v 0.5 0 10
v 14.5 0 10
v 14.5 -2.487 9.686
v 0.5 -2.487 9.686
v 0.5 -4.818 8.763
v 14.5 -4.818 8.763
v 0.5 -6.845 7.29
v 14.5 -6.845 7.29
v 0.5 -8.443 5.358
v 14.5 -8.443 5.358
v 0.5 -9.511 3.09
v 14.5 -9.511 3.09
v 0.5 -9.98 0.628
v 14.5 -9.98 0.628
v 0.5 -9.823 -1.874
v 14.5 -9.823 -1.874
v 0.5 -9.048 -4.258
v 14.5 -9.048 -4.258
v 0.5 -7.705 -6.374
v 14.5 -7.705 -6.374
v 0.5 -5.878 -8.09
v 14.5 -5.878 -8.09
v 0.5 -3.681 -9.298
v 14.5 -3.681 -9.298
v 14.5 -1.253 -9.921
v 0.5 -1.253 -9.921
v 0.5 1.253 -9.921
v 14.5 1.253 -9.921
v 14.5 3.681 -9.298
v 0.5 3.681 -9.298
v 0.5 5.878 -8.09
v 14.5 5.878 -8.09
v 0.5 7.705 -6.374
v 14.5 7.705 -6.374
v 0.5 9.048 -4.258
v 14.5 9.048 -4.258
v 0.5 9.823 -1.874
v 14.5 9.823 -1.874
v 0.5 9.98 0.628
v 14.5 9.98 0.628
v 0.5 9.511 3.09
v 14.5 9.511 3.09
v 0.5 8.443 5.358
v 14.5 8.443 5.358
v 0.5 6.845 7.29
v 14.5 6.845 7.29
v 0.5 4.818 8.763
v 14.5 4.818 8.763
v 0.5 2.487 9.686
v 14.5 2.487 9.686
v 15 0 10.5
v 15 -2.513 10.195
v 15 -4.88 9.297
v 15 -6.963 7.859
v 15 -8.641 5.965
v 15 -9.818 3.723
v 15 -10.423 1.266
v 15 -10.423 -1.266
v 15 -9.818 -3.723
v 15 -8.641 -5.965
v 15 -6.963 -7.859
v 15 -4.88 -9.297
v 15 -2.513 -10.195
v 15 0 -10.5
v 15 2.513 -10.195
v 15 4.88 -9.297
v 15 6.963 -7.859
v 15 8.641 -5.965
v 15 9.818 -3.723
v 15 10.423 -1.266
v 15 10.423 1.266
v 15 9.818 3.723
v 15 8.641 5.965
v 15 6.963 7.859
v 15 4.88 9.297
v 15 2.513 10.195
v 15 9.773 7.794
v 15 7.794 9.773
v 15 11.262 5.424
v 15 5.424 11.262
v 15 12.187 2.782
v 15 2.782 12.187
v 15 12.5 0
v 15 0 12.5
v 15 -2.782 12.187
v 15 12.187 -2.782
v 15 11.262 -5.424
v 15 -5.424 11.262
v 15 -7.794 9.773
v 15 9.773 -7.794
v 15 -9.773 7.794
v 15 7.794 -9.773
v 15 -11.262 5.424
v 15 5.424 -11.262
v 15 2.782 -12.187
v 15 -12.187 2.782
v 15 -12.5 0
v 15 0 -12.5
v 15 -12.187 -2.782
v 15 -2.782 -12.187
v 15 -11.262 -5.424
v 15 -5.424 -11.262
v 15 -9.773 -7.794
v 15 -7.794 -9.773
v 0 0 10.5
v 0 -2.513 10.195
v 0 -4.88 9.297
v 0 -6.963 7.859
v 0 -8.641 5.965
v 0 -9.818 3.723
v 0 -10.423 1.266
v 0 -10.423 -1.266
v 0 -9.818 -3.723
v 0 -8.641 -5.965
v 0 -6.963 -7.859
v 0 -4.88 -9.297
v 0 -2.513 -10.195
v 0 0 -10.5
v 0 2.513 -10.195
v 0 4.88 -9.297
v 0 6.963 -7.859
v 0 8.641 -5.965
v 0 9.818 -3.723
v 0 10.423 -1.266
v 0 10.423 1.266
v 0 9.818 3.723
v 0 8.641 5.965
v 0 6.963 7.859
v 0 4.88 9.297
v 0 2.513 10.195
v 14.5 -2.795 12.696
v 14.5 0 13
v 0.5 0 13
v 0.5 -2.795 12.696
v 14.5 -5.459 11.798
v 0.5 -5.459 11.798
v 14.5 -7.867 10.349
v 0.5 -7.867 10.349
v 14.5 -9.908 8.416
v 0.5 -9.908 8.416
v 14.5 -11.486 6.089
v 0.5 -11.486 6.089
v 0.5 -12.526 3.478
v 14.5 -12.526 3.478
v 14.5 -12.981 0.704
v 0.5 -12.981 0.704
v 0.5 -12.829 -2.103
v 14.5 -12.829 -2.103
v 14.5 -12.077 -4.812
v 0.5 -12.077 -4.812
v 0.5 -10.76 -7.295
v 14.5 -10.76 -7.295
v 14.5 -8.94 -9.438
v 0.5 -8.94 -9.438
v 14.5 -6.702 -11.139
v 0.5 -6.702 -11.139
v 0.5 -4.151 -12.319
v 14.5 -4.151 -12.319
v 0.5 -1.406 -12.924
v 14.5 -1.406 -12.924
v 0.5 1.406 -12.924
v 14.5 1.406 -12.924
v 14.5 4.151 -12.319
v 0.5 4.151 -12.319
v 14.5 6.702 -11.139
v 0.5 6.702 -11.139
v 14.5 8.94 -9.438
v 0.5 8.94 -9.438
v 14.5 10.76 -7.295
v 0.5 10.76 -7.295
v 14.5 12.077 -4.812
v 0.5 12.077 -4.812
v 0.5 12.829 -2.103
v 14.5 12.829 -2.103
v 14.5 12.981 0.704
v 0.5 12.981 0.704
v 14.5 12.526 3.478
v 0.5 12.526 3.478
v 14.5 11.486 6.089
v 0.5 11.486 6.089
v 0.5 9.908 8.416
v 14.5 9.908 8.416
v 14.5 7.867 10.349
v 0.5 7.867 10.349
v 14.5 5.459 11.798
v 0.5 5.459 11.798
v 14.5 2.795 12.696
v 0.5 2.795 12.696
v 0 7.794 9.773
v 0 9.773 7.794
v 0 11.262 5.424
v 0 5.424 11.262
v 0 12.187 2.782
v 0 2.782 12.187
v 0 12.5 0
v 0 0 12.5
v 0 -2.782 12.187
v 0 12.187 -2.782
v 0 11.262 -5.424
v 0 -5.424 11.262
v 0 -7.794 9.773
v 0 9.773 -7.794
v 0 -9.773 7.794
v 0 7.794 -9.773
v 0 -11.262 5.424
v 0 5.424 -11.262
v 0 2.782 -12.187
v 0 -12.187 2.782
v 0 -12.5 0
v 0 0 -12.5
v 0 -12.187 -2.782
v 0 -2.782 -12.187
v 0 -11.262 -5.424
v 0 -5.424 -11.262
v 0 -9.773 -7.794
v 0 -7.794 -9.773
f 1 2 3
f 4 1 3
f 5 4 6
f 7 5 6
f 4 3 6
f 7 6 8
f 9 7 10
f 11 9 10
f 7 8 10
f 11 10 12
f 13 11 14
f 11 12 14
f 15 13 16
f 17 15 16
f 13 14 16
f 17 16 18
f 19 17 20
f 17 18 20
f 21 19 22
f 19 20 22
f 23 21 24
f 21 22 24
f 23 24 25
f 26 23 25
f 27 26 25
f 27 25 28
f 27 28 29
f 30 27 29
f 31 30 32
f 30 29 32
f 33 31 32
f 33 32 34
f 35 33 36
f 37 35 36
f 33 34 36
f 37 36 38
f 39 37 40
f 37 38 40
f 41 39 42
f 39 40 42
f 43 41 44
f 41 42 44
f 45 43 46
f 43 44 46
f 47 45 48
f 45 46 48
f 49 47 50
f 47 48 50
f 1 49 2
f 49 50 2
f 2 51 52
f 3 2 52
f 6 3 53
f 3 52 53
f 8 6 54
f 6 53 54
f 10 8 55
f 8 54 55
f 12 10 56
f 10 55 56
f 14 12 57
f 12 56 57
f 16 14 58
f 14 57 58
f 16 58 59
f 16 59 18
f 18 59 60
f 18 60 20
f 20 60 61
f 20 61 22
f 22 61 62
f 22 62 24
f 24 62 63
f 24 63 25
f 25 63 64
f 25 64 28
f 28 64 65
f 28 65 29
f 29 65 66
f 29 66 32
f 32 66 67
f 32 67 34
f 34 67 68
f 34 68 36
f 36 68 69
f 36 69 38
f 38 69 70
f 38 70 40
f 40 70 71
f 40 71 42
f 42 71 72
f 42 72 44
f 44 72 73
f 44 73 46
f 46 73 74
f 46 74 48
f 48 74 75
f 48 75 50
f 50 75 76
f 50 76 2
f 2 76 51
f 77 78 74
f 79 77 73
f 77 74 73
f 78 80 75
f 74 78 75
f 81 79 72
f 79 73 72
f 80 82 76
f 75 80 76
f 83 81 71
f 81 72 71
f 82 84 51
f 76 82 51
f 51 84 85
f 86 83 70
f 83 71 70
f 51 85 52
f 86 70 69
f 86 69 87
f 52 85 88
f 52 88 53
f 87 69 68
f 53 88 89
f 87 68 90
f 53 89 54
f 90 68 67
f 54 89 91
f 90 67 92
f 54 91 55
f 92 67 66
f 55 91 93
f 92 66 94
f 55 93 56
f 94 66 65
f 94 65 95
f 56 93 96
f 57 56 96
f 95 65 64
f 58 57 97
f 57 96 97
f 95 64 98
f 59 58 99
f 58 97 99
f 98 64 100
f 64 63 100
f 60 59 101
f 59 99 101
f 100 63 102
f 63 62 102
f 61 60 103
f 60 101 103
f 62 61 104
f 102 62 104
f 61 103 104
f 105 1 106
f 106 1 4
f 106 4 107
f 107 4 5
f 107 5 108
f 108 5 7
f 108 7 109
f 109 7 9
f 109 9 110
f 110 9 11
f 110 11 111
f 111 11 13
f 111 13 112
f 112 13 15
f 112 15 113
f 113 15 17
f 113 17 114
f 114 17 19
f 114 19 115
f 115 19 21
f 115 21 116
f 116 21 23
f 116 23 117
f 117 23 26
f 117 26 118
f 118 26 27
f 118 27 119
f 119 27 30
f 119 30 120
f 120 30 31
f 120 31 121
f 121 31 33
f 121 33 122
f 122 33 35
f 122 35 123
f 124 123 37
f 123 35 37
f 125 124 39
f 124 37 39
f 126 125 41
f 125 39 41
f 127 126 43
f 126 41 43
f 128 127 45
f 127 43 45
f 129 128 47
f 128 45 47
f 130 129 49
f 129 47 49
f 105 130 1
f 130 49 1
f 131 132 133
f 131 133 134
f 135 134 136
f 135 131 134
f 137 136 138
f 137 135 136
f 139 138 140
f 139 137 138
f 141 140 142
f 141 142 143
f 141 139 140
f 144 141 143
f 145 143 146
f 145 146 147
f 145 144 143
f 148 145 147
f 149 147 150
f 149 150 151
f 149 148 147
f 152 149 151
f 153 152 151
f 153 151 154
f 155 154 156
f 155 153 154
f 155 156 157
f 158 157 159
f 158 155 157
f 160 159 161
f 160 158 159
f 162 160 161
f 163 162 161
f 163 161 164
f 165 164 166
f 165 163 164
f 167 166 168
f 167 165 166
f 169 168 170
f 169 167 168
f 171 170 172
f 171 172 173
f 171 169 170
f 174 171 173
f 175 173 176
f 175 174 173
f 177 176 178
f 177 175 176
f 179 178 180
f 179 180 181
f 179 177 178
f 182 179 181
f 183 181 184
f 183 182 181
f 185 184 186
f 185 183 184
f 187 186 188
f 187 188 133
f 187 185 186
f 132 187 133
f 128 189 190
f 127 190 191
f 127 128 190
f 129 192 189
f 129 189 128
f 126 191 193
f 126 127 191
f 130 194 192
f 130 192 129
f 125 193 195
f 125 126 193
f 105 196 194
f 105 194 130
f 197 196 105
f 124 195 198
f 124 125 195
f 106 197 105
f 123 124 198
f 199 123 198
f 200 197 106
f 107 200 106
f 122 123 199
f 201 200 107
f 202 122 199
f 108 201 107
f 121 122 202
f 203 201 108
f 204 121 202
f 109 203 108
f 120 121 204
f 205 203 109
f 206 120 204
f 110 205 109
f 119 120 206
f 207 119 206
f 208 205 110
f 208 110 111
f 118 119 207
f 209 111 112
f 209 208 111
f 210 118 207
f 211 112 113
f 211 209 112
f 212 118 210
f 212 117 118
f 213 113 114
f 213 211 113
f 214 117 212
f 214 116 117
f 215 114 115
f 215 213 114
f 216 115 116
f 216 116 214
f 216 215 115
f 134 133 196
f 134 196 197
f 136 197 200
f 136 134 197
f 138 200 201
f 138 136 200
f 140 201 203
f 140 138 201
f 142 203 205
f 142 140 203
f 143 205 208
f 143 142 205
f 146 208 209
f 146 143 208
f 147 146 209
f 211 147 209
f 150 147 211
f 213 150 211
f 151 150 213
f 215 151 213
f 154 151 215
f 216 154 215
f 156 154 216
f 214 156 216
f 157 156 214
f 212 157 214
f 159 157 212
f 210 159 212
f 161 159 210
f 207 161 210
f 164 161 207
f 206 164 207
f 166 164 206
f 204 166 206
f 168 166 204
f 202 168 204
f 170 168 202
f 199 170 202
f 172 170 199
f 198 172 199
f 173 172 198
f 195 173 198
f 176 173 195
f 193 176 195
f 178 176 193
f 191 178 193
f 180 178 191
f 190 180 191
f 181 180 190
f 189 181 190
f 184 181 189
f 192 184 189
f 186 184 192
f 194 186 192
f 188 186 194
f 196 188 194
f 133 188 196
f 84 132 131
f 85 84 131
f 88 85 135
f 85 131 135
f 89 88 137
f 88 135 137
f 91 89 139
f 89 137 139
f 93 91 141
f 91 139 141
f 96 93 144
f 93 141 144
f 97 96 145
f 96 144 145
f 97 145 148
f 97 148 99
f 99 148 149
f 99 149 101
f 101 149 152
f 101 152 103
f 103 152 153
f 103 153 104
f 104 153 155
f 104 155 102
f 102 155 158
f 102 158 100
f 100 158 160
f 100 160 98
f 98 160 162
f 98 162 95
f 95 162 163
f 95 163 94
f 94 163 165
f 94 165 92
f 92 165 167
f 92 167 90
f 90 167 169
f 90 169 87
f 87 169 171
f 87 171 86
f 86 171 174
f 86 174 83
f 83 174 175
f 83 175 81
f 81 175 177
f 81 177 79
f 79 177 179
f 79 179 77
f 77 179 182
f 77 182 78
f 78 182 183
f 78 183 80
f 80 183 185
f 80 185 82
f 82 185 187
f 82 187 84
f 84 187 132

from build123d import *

# Parameters (mm, degrees)
SKICA1_W     = 15
SKICA1_H     = 3
ZKOSIT1_SIZE = 0.5


with BuildPart() as part:
    # Skica1 → Otočit kolem osy1 (revolve)
    with BuildSketch(Plane.XY, mode=Mode.PRIVATE) as oto_it_kolem_osy1_sk:
        with Locations((7.5, 11.5)):
            Rectangle(SKICA1_W, SKICA1_H)
    revolve(oto_it_kolem_osy1_sk.sketch.rotate(Axis((0, 0, 0), (1, 0, 0)), 90), axis=Axis((0, 0, 0), (1, 0, 0)))

    # Zkosit1
    zkosit1_edges = [part.edges().sort_by_distance(p)[0] for p in [
        (0, 0, -10),
        (15, 0, -10),
        (15, 0, -13),
        (0, 0, -13),
    ]]
    chamfer(zkosit1_edges, length=ZKOSIT1_SIZE)


solid = part.part
